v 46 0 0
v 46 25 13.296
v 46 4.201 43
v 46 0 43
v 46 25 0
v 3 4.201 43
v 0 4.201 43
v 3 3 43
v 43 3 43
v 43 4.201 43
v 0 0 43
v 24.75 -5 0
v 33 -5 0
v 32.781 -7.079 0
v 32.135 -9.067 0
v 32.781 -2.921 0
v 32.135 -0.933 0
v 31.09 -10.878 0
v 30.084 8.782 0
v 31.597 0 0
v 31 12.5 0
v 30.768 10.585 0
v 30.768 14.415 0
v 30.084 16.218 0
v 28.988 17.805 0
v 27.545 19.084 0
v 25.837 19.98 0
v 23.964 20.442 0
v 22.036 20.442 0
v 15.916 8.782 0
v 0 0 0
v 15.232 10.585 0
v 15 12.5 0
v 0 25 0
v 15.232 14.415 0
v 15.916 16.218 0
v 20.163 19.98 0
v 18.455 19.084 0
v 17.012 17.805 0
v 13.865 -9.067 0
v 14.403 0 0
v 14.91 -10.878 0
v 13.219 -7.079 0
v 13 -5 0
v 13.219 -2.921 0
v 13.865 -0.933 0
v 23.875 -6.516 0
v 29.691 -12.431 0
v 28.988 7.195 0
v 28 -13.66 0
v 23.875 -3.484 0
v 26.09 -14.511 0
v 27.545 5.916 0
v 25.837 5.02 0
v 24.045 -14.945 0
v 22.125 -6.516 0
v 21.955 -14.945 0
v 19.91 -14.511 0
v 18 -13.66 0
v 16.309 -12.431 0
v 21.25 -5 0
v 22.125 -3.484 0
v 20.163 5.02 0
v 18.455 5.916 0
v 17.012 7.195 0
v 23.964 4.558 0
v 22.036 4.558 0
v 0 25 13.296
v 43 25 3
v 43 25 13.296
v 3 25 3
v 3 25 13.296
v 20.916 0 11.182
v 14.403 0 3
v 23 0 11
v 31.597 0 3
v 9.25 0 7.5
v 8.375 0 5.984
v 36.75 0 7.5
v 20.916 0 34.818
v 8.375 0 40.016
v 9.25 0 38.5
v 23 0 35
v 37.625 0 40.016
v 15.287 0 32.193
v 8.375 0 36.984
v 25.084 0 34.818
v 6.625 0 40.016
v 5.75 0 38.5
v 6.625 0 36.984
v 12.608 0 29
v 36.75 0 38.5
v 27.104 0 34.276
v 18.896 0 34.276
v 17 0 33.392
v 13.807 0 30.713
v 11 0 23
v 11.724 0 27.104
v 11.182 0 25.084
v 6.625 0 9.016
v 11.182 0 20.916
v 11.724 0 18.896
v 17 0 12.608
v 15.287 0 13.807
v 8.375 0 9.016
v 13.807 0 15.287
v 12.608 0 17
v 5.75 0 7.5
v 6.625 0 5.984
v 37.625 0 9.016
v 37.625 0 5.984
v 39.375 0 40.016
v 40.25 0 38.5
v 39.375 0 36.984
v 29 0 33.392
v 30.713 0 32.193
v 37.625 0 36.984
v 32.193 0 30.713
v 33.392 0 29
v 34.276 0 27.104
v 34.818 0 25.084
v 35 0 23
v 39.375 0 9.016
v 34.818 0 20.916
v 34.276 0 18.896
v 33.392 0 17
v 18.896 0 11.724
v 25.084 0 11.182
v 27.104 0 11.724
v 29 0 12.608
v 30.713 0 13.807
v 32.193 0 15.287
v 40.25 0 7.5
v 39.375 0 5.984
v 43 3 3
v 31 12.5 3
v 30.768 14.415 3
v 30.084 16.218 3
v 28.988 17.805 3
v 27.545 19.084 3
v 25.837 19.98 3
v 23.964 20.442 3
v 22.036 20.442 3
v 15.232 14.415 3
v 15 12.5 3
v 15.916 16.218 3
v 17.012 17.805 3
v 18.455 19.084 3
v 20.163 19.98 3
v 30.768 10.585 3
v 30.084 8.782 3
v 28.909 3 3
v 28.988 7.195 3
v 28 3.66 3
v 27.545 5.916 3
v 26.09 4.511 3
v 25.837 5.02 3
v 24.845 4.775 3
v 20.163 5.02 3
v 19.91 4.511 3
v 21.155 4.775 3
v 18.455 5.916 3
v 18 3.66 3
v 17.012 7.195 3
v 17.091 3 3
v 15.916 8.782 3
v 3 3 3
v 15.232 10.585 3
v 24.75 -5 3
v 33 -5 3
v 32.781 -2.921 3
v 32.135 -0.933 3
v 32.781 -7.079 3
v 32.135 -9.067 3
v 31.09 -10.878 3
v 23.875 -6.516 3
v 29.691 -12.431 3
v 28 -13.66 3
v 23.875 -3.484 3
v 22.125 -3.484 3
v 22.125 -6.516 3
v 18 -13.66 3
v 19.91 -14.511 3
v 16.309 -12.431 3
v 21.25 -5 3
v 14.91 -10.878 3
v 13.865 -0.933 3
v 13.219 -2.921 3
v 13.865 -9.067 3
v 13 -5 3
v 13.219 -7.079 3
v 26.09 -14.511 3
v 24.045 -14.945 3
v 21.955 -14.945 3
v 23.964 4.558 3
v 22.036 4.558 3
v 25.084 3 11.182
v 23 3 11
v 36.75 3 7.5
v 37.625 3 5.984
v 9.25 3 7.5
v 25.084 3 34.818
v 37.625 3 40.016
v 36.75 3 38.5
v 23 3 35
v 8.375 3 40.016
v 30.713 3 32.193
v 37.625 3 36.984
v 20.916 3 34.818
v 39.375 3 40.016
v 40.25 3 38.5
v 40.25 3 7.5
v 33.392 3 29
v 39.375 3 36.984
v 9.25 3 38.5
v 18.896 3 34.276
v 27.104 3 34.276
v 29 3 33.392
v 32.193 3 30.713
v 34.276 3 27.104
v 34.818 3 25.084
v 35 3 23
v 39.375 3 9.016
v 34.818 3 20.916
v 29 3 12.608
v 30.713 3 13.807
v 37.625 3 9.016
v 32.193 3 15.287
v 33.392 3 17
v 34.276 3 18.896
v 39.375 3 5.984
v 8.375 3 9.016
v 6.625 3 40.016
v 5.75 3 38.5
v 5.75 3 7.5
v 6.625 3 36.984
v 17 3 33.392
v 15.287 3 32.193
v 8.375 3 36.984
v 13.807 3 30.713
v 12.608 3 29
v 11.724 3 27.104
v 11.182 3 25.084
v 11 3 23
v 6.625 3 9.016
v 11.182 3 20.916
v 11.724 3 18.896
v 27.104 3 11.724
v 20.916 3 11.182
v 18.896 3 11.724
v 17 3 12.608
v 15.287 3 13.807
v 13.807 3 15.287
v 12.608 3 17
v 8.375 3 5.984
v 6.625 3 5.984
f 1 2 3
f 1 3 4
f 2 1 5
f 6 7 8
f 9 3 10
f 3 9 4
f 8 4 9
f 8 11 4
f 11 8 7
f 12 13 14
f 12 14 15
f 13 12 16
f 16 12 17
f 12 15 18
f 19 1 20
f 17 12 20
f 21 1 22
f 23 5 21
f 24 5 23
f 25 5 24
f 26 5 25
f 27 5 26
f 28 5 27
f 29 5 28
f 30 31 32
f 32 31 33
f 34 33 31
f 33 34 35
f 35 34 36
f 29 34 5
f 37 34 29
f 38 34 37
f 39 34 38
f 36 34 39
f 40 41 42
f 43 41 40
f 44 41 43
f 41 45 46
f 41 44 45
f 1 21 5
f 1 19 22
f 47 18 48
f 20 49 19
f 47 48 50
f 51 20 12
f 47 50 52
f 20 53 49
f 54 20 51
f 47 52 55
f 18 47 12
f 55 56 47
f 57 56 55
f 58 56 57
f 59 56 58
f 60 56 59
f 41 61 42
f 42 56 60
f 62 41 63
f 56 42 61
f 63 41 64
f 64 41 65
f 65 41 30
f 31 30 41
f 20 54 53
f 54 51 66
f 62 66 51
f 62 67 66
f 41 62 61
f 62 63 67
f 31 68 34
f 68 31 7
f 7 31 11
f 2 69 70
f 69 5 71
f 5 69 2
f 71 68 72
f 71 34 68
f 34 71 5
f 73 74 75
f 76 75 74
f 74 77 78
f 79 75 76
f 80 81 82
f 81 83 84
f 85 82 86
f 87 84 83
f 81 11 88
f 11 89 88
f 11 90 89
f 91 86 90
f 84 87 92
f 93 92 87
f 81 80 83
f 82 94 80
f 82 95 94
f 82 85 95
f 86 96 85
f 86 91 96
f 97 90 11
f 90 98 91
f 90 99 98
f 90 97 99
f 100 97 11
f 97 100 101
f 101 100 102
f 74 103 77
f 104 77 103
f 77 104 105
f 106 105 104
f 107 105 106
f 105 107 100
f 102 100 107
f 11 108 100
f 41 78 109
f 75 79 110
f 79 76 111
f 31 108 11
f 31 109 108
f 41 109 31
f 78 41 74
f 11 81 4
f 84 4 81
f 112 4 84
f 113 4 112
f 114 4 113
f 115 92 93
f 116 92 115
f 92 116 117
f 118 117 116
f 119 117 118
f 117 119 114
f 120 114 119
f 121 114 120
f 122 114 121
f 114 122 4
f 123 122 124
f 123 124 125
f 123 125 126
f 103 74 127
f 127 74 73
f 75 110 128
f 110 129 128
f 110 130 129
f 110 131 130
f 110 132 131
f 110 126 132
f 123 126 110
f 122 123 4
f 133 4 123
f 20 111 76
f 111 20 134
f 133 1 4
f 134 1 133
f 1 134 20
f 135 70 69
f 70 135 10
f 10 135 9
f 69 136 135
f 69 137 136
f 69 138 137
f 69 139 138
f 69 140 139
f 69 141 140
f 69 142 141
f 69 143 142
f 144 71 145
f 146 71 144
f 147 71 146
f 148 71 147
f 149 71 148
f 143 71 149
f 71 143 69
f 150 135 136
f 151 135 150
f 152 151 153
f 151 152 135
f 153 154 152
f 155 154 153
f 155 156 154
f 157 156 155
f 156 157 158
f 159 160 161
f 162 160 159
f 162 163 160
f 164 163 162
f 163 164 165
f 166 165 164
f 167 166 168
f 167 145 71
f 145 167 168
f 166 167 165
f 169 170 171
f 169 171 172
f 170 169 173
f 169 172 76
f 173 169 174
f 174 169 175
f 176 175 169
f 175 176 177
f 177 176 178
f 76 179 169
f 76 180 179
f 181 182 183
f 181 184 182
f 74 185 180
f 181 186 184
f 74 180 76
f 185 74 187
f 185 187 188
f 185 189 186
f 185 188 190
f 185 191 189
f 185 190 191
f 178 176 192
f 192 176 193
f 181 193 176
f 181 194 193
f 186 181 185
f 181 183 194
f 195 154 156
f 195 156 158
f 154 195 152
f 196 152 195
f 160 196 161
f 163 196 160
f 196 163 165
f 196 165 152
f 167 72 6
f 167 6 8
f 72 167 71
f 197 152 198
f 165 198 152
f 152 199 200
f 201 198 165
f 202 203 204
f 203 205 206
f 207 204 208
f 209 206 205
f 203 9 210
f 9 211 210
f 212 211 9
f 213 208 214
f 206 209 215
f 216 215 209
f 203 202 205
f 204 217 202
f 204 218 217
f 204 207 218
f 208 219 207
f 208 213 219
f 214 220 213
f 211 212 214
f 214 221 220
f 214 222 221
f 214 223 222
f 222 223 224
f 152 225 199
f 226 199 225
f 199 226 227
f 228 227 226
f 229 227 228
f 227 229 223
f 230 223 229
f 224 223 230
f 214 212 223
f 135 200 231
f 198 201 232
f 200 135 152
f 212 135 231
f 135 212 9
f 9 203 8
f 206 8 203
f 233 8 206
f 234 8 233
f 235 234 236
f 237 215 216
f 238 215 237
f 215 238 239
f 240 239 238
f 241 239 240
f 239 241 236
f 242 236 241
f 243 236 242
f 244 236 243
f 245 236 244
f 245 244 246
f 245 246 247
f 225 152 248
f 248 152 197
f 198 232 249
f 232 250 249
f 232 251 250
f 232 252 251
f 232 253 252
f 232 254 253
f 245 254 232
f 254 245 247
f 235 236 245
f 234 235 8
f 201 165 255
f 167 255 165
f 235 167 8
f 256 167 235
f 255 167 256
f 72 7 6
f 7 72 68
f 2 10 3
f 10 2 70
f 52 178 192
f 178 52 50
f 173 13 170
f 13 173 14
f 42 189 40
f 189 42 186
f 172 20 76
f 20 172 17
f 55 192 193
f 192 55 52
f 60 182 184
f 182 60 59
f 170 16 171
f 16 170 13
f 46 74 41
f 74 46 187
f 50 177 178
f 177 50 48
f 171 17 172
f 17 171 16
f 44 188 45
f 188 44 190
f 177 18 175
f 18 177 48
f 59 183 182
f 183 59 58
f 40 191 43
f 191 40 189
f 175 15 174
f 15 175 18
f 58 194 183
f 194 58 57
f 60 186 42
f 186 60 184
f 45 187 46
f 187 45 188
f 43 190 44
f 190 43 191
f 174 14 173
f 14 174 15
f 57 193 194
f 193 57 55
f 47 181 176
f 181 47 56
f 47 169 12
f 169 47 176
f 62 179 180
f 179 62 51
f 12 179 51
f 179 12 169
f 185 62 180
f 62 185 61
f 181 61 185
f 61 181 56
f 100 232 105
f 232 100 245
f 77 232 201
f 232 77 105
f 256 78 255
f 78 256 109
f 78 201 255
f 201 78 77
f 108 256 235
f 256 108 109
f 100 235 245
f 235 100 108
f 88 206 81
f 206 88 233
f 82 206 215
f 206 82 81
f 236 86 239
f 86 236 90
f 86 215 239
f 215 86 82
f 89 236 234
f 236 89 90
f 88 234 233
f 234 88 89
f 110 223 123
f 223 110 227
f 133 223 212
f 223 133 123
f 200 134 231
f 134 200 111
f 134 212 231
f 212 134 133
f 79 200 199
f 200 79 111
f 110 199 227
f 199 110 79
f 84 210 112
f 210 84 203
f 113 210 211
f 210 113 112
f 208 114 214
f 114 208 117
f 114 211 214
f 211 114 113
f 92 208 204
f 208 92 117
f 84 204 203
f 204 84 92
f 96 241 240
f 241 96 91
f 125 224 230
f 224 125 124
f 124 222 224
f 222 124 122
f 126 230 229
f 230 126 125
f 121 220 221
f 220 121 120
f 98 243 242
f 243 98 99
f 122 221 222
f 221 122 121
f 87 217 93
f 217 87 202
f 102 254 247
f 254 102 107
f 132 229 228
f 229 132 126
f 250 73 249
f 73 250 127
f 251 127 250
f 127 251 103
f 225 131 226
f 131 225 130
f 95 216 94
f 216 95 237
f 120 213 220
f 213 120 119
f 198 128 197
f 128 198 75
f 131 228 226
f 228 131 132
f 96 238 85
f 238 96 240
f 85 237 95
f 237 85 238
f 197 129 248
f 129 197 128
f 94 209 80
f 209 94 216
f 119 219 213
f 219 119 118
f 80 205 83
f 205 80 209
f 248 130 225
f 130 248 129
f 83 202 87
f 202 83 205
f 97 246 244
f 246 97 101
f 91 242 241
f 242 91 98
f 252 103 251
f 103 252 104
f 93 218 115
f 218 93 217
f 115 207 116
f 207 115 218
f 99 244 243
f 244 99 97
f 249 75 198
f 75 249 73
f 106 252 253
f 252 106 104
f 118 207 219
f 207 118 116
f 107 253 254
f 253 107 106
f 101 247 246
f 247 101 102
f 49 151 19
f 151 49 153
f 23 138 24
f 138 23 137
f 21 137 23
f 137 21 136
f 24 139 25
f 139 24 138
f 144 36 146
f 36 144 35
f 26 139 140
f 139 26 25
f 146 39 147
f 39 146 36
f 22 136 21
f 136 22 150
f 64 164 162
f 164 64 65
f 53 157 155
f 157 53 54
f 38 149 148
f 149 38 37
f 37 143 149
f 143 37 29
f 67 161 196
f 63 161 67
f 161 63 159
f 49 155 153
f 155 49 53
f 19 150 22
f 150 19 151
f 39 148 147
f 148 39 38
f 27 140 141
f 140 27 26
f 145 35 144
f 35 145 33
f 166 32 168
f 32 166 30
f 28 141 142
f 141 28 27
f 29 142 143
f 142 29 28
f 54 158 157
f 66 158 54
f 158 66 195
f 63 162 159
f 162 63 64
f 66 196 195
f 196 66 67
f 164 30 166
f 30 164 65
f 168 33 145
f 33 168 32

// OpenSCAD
motor_width = 40;
motor_length = 25;
motor_heigth = 40;
base_hole_radius = 8;

wall_thickness = 3;
wall_angle = -55;
bottom_thickness = 3;

motor_holes_space = 31;
m3_nuts_radius = 1.75;
motor_head_recess = 12;

x1 = (motor_width/2)+wall_thickness-(motor_holes_space/2);
z1 = (motor_heigth/2)+bottom_thickness-(motor_holes_space/2);

x2 = x1 + motor_holes_space;
z2 = z1 + motor_holes_space;

ear_radius = 10;

ears_fb_x_trans = motor_width/2+wall_thickness;
ears_fb_y_trans1 = -1*ear_radius/2;
ears_fb_y_trans2 = motor_length+ear_radius/2;

module walls()
{
	difference()
	{
		cube([motor_width+(2*wall_thickness), motor_length, motor_heigth+bottom_thickness]);

		translate([wall_thickness,wall_thickness, bottom_thickness])
			cube([motor_width, motor_length, motor_heigth]);

		translate([0, 0, motor_heigth+(3*bottom_thickness)])
			rotate(a=wall_angle, v=[1,0,0])
				translate([0, -0.5*motor_length, 0])
					cube([motor_width+(2*wall_thickness),4*motor_length, motor_heigth]);
	}
}

// Side motor mounting holes
module ears()
{
	difference()
	{
		union()
		{
			translate([-1*ear_radius/2,ear_radius,0])
				cylinder(r=ear_radius, h=bottom_thickness);
		
			translate([-1*ear_radius/2,motor_length-ear_radius,0])
				cylinder(r=ear_radius, h=bottom_thickness);

			translate([motor_width+(2*wall_thickness)+(ear_radius/2),ear_radius,0])
				cylinder(r=ear_radius, h=bottom_thickness);

			translate([motor_width+(2*wall_thickness)+(ear_radius/2),motor_length-ear_radius,0])
				cylinder(r=ear_radius, h=bottom_thickness);
		}

		// Mount attachment holes
		translate([-1*ear_radius/2,ear_radius,0])
			cylinder(r=m3_nuts_radius, h=bottom_thickness);

		translate([-1*ear_radius/2,motor_length-ear_radius,0])
			cylinder(r=m3_nuts_radius, h=bottom_thickness);

		translate([motor_width+(2*wall_thickness)+(ear_radius/2),ear_radius,0])
			cylinder(r=m3_nuts_radius, h=bottom_thickness);

		translate([motor_width+(2*wall_thickness)+(ear_radius/2),motor_length-ear_radius,0])
			cylinder(r=m3_nuts_radius, h=bottom_thickness);
	}
}

// Front motor mounting holes
module ears_f()
{
	difference()
	{
		translate([ears_fb_x_trans,ears_fb_y_trans1,0])
				cylinder(r=ear_radius, h=bottom_thickness);

		// Mount attachment holes
		translate([ears_fb_x_trans,ears_fb_y_trans1,0])
			cylinder(r=m3_nuts_radius, h=bottom_thickness);
	}
}

// Rear motor mounting holes
module ears_b()
{
	difference()
	{

		translate([ears_fb_x_trans,ears_fb_y_trans2,0])
				cylinder(r=ear_radius, h=bottom_thickness);

		translate([ears_fb_x_trans,ears_fb_y_trans2,0])
			cylinder(r=m3_nuts_radius, h=bottom_thickness);
	}
}

// Motor support
difference()
{
	union()
	{
		walls();
//		ears();
		ears_f();
//		ears_b();
	}

	// Motor screws
	translate([x1, -1, z1])
		rotate(a=-90, v=[1,0,0])
			cylinder(r=m3_nuts_radius, h=2*wall_thickness);

	translate([x1, -1, z2])
		rotate(a=-90, v=[1,0,0])
			cylinder(r=m3_nuts_radius, h=2*wall_thickness);

	translate([x2, -1, z1])
		rotate(a=-90, v=[1,0,0])
			cylinder(r=m3_nuts_radius, h=2*wall_thickness);

	translate([x2, -1, z2])
		rotate(a=-90, v=[1,0,0])
			cylinder(r=m3_nuts_radius, h=2*wall_thickness);

	// Motor recess
	translate([(motor_width/2)+wall_thickness, -1,bottom_thickness+(motor_heigth/2)])
		rotate(a=-90, v=[1,0,0])
			cylinder(r=motor_head_recess, h=2*wall_thickness, $fn=36);



	translate([(motor_width/2)+wall_thickness,motor_length/2,0])
		cylinder(r=base_hole_radius, h=bottom_thickness);

}
